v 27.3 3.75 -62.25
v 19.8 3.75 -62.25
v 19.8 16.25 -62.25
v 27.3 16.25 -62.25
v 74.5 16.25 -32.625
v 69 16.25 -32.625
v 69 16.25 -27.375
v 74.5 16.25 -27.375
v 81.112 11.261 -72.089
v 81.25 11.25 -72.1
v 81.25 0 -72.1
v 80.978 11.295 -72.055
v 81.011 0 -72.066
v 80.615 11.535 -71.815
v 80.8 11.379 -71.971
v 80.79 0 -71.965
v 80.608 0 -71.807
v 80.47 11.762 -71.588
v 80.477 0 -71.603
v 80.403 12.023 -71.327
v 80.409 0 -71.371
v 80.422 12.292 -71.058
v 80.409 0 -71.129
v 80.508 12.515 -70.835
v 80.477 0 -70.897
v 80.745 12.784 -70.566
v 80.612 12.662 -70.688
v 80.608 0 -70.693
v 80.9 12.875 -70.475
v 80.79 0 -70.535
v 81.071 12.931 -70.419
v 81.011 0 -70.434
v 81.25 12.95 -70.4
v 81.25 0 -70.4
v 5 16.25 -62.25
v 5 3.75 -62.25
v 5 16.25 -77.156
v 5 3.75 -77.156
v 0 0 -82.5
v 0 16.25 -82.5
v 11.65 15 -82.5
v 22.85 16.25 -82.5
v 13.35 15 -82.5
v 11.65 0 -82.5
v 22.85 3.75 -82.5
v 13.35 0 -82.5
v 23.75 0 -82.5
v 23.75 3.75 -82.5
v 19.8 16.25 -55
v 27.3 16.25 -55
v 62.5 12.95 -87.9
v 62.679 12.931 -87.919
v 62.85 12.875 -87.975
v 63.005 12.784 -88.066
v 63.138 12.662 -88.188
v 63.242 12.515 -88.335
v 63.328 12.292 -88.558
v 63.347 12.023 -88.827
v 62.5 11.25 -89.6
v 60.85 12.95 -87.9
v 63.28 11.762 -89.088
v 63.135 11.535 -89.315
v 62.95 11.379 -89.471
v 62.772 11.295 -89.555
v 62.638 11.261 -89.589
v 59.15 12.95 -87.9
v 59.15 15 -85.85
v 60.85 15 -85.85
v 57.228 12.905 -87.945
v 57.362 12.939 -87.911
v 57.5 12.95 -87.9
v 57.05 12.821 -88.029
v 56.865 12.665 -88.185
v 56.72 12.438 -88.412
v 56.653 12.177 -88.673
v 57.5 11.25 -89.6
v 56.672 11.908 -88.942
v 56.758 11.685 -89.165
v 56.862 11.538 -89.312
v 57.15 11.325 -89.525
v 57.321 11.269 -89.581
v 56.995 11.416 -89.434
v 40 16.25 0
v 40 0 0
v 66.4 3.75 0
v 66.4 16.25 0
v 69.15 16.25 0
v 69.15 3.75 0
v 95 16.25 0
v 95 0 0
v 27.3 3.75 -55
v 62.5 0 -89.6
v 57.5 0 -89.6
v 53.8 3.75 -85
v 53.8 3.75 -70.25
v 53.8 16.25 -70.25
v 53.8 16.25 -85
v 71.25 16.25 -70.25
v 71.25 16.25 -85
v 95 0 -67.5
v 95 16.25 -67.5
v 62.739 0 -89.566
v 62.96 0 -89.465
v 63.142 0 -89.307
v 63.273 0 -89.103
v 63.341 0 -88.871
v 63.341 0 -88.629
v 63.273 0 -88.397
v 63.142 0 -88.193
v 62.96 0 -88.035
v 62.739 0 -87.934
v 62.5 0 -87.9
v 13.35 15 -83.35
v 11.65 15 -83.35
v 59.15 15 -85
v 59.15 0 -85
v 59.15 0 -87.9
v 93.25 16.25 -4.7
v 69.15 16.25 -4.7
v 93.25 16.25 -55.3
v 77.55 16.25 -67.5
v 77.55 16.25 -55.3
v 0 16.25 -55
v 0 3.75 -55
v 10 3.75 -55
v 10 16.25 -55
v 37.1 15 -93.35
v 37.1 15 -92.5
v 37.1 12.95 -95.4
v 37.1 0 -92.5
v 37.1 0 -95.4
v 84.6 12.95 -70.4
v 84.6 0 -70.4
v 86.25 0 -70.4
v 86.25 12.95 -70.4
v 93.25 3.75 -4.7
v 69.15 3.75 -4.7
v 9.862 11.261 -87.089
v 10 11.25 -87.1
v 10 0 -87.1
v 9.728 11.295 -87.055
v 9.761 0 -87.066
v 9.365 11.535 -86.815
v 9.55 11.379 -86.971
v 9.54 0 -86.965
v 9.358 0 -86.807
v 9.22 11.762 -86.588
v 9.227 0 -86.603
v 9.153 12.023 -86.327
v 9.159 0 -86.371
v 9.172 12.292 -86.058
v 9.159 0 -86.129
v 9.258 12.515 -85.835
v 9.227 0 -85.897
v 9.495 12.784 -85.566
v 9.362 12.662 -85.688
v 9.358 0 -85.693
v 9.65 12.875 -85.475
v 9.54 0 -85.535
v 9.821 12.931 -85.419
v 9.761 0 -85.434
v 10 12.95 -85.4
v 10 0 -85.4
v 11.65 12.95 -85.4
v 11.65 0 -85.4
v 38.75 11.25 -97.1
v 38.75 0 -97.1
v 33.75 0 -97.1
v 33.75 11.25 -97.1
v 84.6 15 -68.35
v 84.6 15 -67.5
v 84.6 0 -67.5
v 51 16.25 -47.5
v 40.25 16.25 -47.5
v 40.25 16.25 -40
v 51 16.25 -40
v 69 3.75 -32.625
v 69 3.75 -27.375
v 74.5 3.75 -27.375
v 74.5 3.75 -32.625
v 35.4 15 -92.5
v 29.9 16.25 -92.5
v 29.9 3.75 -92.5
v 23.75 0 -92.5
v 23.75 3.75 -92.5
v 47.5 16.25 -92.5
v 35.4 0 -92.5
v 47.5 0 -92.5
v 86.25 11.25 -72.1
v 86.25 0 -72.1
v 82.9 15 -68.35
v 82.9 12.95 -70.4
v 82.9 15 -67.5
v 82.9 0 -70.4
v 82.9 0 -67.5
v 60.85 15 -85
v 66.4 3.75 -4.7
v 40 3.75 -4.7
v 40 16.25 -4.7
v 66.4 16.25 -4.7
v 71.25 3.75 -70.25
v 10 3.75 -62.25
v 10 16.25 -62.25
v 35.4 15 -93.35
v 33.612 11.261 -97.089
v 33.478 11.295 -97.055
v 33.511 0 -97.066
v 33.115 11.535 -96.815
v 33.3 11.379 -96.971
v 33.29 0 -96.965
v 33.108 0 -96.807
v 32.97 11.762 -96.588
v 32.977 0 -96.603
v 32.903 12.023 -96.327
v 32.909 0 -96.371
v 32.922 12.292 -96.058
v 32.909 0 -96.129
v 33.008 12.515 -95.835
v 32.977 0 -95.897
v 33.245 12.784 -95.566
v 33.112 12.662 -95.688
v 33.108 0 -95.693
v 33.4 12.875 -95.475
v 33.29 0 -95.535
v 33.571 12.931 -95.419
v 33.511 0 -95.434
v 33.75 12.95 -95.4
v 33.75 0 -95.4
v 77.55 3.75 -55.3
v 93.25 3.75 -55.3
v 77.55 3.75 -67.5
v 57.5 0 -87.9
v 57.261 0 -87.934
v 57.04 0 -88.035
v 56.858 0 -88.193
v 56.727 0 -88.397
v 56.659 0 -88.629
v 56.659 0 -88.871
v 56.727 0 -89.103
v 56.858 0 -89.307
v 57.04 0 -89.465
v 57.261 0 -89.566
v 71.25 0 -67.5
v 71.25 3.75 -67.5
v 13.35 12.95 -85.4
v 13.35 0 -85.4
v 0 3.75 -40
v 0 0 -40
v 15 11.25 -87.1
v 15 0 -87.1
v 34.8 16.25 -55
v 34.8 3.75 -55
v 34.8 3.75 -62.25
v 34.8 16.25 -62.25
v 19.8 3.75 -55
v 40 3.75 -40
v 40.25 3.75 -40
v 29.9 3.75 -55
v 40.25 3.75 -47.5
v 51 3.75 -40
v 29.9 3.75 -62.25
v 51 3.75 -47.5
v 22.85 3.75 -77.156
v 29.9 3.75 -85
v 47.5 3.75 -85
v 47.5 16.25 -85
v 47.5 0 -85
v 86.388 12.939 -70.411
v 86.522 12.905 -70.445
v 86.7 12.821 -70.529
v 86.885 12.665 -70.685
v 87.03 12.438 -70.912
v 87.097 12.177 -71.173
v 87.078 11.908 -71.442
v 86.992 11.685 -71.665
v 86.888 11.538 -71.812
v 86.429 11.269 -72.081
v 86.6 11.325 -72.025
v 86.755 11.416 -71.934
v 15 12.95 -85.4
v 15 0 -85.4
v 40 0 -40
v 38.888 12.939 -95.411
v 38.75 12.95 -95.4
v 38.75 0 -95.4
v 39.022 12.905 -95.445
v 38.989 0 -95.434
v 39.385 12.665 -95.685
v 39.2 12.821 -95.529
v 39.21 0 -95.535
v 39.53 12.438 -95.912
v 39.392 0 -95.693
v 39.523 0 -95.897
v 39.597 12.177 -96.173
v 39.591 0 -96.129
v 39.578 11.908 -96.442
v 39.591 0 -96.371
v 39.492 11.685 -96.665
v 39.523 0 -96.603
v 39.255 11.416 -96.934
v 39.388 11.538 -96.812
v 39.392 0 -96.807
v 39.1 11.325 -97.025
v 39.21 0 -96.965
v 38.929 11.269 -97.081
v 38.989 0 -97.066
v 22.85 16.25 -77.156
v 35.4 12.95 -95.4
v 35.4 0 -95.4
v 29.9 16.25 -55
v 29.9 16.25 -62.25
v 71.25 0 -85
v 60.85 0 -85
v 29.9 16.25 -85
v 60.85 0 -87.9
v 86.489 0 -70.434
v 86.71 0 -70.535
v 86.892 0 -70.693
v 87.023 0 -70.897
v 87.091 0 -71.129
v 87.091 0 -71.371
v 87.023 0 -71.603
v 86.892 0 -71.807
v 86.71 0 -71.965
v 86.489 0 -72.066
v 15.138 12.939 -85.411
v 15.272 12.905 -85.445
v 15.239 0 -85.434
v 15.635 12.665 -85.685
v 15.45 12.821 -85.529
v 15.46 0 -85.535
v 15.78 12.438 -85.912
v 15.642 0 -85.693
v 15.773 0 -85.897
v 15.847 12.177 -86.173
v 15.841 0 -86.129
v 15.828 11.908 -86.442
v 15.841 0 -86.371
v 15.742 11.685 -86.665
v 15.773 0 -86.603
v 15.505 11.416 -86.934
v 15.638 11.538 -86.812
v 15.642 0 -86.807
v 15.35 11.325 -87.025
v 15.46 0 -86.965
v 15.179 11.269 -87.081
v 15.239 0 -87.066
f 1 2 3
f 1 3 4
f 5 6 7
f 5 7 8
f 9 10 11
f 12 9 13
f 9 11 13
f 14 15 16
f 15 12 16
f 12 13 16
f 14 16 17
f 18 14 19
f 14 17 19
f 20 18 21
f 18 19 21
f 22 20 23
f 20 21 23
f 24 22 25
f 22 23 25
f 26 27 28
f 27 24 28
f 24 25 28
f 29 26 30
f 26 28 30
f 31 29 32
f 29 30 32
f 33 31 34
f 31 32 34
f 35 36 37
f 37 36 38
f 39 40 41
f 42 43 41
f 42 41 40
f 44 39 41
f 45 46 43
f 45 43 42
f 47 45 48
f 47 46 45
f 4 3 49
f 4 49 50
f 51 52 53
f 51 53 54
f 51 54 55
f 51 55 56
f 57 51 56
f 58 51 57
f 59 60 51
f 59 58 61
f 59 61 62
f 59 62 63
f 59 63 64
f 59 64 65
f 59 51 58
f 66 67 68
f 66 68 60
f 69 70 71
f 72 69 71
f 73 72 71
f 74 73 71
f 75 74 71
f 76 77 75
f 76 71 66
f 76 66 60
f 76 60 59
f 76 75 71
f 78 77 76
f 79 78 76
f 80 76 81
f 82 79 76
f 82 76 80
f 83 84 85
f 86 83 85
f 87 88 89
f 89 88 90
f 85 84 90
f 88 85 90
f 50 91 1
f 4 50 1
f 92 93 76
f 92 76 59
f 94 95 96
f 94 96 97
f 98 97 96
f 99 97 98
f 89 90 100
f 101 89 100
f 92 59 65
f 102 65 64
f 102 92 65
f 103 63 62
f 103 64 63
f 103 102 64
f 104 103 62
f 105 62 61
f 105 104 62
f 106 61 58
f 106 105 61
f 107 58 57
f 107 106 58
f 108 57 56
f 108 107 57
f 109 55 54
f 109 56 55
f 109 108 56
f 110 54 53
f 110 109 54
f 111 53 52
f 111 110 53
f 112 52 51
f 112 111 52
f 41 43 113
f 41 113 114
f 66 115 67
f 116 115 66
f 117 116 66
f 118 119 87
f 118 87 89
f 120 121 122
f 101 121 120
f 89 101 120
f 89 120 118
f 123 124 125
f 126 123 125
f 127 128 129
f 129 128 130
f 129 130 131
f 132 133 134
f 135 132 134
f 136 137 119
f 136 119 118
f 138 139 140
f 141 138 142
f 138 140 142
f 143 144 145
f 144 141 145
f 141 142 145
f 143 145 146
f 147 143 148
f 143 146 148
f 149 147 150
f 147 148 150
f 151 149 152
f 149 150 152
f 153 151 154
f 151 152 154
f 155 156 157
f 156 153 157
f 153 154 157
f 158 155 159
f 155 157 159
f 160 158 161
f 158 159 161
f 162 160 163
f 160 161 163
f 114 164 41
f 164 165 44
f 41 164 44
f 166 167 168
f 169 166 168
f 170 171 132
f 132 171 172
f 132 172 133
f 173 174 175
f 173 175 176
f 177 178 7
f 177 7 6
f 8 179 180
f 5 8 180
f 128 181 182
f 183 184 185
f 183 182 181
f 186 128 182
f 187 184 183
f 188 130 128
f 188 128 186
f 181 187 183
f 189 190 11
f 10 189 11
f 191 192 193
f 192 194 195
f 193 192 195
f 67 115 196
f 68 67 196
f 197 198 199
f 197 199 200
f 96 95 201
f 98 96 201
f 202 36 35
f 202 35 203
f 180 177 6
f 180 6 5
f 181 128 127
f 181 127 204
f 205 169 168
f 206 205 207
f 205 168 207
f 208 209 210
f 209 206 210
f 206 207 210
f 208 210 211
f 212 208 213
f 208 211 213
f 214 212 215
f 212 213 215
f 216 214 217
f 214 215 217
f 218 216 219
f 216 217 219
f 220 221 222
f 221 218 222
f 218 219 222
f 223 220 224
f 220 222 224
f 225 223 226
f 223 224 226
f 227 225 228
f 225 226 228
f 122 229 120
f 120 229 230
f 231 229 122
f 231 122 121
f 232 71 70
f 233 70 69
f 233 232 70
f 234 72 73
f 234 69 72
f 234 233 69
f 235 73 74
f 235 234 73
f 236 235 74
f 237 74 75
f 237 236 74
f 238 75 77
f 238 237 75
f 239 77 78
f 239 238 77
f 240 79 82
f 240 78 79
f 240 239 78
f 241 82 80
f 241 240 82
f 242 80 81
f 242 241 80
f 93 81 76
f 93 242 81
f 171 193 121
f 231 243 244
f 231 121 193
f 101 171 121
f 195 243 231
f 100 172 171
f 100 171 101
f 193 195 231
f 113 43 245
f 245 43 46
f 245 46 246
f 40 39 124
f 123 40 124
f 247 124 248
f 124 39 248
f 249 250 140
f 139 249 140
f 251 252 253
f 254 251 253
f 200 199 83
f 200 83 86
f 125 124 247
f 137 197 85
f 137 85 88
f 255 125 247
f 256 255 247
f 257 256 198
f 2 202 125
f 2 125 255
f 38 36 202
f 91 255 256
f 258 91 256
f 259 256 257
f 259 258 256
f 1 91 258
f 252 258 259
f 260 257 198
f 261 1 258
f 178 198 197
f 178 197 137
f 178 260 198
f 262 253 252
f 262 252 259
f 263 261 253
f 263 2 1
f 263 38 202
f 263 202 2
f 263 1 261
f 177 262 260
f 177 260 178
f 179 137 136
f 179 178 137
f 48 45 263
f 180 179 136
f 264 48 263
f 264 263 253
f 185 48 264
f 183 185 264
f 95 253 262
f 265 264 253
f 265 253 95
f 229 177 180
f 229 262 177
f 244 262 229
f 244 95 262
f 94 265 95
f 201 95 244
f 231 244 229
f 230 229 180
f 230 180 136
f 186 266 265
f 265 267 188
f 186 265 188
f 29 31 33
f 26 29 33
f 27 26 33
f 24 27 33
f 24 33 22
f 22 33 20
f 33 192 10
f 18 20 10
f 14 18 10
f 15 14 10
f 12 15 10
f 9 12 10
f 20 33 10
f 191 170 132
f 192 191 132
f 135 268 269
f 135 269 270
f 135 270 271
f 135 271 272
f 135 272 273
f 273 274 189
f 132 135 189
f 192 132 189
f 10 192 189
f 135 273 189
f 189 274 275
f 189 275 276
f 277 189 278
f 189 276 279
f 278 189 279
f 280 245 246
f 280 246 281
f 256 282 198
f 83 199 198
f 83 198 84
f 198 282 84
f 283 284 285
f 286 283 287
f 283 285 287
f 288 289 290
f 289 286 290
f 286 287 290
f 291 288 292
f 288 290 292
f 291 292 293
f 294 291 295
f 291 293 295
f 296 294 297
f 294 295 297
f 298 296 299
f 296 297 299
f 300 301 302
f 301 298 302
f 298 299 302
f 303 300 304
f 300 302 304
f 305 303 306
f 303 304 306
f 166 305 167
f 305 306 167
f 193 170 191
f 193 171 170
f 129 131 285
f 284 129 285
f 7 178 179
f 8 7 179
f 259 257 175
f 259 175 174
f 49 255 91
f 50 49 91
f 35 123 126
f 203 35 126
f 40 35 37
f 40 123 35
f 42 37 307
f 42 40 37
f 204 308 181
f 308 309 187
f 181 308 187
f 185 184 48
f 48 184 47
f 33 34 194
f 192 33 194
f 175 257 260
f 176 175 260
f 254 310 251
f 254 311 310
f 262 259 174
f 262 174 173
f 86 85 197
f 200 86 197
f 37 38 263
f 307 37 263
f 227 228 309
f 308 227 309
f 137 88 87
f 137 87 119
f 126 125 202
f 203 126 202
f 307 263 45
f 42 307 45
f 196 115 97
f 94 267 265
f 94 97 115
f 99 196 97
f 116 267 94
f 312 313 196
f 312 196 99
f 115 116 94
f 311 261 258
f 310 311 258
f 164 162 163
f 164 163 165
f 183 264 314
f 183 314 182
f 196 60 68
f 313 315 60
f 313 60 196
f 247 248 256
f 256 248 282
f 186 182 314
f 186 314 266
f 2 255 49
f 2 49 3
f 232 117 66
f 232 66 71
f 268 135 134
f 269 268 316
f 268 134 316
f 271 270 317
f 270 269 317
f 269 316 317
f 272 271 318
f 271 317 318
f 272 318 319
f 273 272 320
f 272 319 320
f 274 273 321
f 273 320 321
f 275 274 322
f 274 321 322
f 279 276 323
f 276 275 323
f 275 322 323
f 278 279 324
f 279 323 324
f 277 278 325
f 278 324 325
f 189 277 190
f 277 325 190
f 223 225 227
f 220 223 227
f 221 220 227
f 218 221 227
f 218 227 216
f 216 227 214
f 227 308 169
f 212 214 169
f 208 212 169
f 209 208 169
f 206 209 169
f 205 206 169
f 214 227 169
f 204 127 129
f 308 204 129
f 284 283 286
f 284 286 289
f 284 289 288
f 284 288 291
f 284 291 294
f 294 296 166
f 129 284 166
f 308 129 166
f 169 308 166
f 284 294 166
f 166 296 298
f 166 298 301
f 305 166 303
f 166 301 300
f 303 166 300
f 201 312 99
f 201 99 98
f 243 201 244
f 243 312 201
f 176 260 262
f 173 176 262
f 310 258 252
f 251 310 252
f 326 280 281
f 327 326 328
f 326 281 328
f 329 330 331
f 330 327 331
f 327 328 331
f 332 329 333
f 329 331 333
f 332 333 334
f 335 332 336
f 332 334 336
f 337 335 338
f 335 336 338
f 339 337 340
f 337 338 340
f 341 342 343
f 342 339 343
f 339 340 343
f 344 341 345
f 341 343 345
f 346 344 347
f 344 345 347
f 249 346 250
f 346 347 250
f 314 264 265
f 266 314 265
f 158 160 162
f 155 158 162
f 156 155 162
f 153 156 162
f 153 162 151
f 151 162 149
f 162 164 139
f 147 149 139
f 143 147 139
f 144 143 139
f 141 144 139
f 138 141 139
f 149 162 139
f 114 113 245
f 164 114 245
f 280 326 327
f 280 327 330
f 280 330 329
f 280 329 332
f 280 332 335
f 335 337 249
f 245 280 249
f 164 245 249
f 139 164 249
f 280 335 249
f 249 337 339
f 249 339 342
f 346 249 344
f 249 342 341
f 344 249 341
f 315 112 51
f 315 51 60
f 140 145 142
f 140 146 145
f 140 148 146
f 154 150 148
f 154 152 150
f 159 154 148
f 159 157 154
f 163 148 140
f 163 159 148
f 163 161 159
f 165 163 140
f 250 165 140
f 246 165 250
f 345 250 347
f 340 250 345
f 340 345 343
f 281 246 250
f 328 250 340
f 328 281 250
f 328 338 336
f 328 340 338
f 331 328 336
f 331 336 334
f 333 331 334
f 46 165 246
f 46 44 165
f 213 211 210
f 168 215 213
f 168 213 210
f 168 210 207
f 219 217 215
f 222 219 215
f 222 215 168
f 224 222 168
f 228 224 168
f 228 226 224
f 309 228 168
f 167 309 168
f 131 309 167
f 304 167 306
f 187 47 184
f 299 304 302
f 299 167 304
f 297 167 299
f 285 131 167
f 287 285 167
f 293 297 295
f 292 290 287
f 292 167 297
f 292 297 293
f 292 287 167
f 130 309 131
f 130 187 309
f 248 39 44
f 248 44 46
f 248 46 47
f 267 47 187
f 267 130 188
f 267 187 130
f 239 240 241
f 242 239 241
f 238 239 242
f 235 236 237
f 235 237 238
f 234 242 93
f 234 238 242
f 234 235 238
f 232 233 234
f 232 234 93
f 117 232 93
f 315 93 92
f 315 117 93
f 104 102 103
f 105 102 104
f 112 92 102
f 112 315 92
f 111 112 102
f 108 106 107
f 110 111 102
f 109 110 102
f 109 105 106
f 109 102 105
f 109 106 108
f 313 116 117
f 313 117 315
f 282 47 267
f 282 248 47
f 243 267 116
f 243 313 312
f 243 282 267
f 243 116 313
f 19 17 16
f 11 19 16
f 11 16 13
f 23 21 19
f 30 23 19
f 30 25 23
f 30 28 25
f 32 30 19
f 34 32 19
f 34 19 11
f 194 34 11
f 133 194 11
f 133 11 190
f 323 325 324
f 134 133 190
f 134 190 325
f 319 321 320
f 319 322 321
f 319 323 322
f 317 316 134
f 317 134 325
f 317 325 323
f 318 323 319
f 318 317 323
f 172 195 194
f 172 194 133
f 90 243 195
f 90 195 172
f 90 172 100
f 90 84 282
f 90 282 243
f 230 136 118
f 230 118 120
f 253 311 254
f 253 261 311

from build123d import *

# Parameters (mm, degrees)
BOSS_EXTRUDE1_DEPTH     = 3.75
SKETCH2_W               = 17.7
SKETCH2_H               = 14.8
SKETCH2_H_2             = 17.5
SKETCH2_W_2             = 7.5
SKETCH2_H_3             = 22.5
SKETCH2_H_4             = 10
SKETCH2_W_3             = 26.4
SKETCH2_H_5             = 4.8
SKETCH2_W_4             = 11
SKETCH2_H_6             = 7.5
SKETCH2_W_5             = 10
SKETCH2_W_6             = 23.1
SKETCH2_H_7             = 7.843975032
SKETCH2_W_7             = 26.1
SKETCH2_W_8             = 5
SKETCH2_W_9             = 5.5
SKETCH2_H_8             = 5.25
BOSS_EXTRUDE2_DEPTH     = 12.5
SKETCH5_W               = 23.75
SKETCH5_H               = 2.5
CUT_EXTRUDE2_DEPTH      = 136.329459099
BOSS_EXTRUDE3_DEPTH     = 15
CHAMFER1_SIZE           = 3.75
CUT_EXTRUDE3_DEPTH      = 137.811814183
CUT_EXTRUDE3_DEPTH_BACK = 12.5
SKETCH7_W               = 0.25
SKETCH7_H               = 5.343975032
SKETCH7_W_2             = 0.1
SKETCH7_H_2             = 7.5
SKETCH7_H_3             = 15
SKETCH7_H_4             = 12.3
SKETCH7_H_5             = 4.8
CUT_EXTRUDE4_DEPTH      = 137.811814183
CUT_EXTRUDE4_DEPTH_BACK = 12.5
SKETCH9_W               = 17.45
SKETCH9_H               = 0.1
SKETCH9_H_2             = 0.25
SKETCH9_W_2             = 34.8
SKETCH9_W_3             = 55
SKETCH10_W              = 1.75
SKETCH10_H              = 50.6
SKETCH10_W_2            = 5
SKETCH10_H_2            = 14.906024968
BOSS_EXTRUDE5_DEPTH     = 12.5


with BuildPart() as part:
    # Sketch1 → Boss-Extrude1 (new body)
    with BuildSketch(Plane(origin=(0, 0, 0), x_dir=(1, 0, 0), z_dir=(0, 1, 0))):
        Polygon((40, 0), (95, 0), (95, 70), (71.25, 70), (71.25, 87.5), (47.5, 87.5), (47.5, 95), (23.75, 95), (23.75, 85), (0, 85), (0, 40), (40, 40), align=None)
    extrude(amount=BOSS_EXTRUDE1_DEPTH)

    # Sketch2 → Boss-Extrude2 (add)
    with BuildSketch(Plane(origin=(0, 3.75, 0), x_dir=(1, 0, 0), z_dir=(0, 1, 0))):
        with Locations((86.15, 62.6)):
            Rectangle(SKETCH2_W, SKETCH2_H)
        with Locations((62.4, 78.75)):
            Rectangle(SKETCH2_W, SKETCH2_H_2)
        with Locations((23.55, 51.25)):
            Rectangle(SKETCH2_W_2, SKETCH2_H_3)
        with Locations((38.65, 90)):
            Rectangle(SKETCH2_W, SKETCH2_H_4)
        with Locations((53.2, 2.4)):
            Rectangle(SKETCH2_W_3, SKETCH2_H_5)
        with Locations((45.5, 43.75)):
            Rectangle(SKETCH2_W_4, SKETCH2_H_6)
        with Locations((5, 51.25)):
            Rectangle(SKETCH2_W_5, SKETCH2_H_3)
        with Locations((11.55, 81.078012484)):
            Rectangle(SKETCH2_W_6, SKETCH2_H_7)
        with Locations((81.95, 2.4)):
            Rectangle(SKETCH2_W_7, SKETCH2_H_5)
        with Locations((32.3, 51.25)):
            Rectangle(SKETCH2_W_8, SKETCH2_H_3)
        with Locations((71.75, 30)):
            Rectangle(SKETCH2_W_9, SKETCH2_H_8)
    extrude(amount=BOSS_EXTRUDE2_DEPTH)

    # Sketch5 → Cut-Extrude2 (cut, through all)
    with BuildSketch(Plane.XZ):
        with Locations((11.875, -83.75)):
            Rectangle(SKETCH5_W, SKETCH5_H)
        with Locations((59.375, -86.25)):
            Rectangle(SKETCH5_W, SKETCH5_H)
        with Locations((35.625, -93.75)):
            Rectangle(SKETCH5_W, SKETCH5_H)
        with Locations((83.125, -68.75)):
            Rectangle(SKETCH5_W, SKETCH5_H)
    extrude(amount=-CUT_EXTRUDE2_DEPTH, mode=Mode.SUBTRACT)

    # Sketch6 → Boss-Extrude3 (add)
    with BuildSketch(Plane.XZ):
        with BuildLine():
            Line((59.15, -87.9), (57.5, -87.9))
            ThreePointArc((57.5, -87.9), (56.65, -88.75), (57.5, -89.6))
            Line((57.5, -89.6), (62.5, -89.6))
            ThreePointArc((62.5, -89.6), (63.35, -88.75), (62.5, -87.9))
            Line((62.5, -87.9), (60.85, -87.9))
            Line((60.85, -87.9), (60.85, -85))
            ThreePointArc((60.85, -85), (60, -84.15), (59.15, -85))
            Line((59.15, -85), (59.15, -87.9))
        make_face()
        with BuildLine():
            Line((37.1, -95.4), (38.75, -95.4))
            ThreePointArc((38.75, -95.4), (39.6, -96.25), (38.75, -97.1))
            Line((38.75, -97.1), (33.75, -97.1))
            ThreePointArc((33.75, -97.1), (32.9, -96.25), (33.75, -95.4))
            Line((33.75, -95.4), (35.4, -95.4))
            Line((35.4, -95.4), (35.4, -92.5))
            ThreePointArc((35.4, -92.5), (36.25, -91.65), (37.1, -92.5))
            Line((37.1, -92.5), (37.1, -95.4))
        make_face()
        with BuildLine():
            Line((13.35, -85.4), (15, -85.4))
            ThreePointArc((15, -85.4), (15.85, -86.25), (15, -87.1))
            Line((15, -87.1), (10, -87.1))
            ThreePointArc((10, -87.1), (9.15, -86.25), (10, -85.4))
            Line((10, -85.4), (11.65, -85.4))
            Line((11.65, -85.4), (11.65, -82.5))
            ThreePointArc((11.65, -82.5), (12.5, -81.65), (13.35, -82.5))
            Line((13.35, -82.5), (13.35, -85.4))
        make_face()
        with BuildLine():
            Line((81.25, -70.4), (82.9, -70.4))
            Line((82.9, -70.4), (82.9, -67.5))
            ThreePointArc((82.9, -67.5), (83.75, -66.65), (84.6, -67.5))
            Line((84.6, -67.5), (84.6, -70.4))
            Line((84.6, -70.4), (86.25, -70.4))
            ThreePointArc((86.25, -70.4), (87.1, -71.25), (86.25, -72.1))
            Line((86.25, -72.1), (81.25, -72.1))
            ThreePointArc((81.25, -72.1), (80.4, -71.25), (81.25, -70.4))
        make_face()
    extrude(amount=-BOSS_EXTRUDE3_DEPTH)

    # Chamfer1
    # the kernel refuses this chamfer: 3.75 mm, written as the material it takes off along each edge
    with BuildSketch(Plane(origin=(47.856188795, 15, -89.6), x_dir=(0, 0.027495876610586334, 0.9996219169112968), z_dir=(1, 0, 0))) as chamfer1_piece_1:
        Polygon((CHAMFER1_SIZE * 0.999621916911, CHAMFER1_SIZE * 0.0274958766106), (-CHAMFER1_SIZE * 0.0274958766106, CHAMFER1_SIZE * 0.999621916911), (0, 0), align=None)
    extrude(amount=24.28762241, mode=Mode.SUBTRACT)
    with BuildSketch(Plane(origin=(48.393811205, 15, -97.1), x_dir=(0, 0.027495876610586334, 0.9996219169112968), z_dir=(-1, 0, 0)), Plane(origin=(95.893811205, 15, -72.1), x_dir=(0, 0.027495876610586334, 0.9996219169112968), z_dir=(-1, 0, 0)), Plane(origin=(24.643811205, 15, -87.1), x_dir=(0, 0.027495876610586334, 0.9996219169112968), z_dir=(-1, 0, 0))) as chamfer1_piece_2:
        Polygon((CHAMFER1_SIZE * 0.999621916911, -CHAMFER1_SIZE * 0.0274958766106), (-CHAMFER1_SIZE * 0.0274958766106, -CHAMFER1_SIZE * 0.999621916911), (0, 0), align=None)
    extrude(amount=24.28762241, mode=Mode.SUBTRACT)

    # Sketch7 → Cut-Extrude3 (cut, two sides: drawn at the far end of the back side and taken through both)
    with BuildSketch(Plane(origin=(0, 16.25, 0), x_dir=(1, 0, 0), z_dir=(0, 1, 0)).offset(-CUT_EXTRUDE3_DEPTH_BACK)):
        with Locations((22.975, 79.828012484)):
            Rectangle(SKETCH7_W, SKETCH7_H)
        with Locations((29.85, 88.75)):
            Rectangle(SKETCH7_W_2, SKETCH7_H_2)
        Polygon((29.8, 62.5), (29.9, 62.5), (29.9, 55), (34.8, 55), (34.8, 40), (0, 40), (0, 55), (29.8, 55), align=None)
        with Locations((53.675, 77.5)):
            Rectangle(SKETCH7_W, SKETCH7_H_3)
        with Locations((40.125, 43.75)):
            Rectangle(SKETCH7_W, SKETCH7_H_2)
        with Locations((77.425, 61.35)):
            Rectangle(SKETCH7_W, SKETCH7_H_4)
        with Locations((69.025, 2.4)):
            Rectangle(SKETCH7_W, SKETCH7_H_5)
    extrude(amount=CUT_EXTRUDE3_DEPTH + CUT_EXTRUDE3_DEPTH_BACK, mode=Mode.SUBTRACT)

    # Sketch9 → Cut-Extrude4 (cut, two sides: drawn at the far end of the back side and taken through both)
    with BuildSketch(Plane(origin=(0, 16.25, 0), x_dir=(1, 0, 0), z_dir=(0, 1, 0)).offset(-CUT_EXTRUDE4_DEPTH_BACK)):
        with Locations((86.275, 55.25)):
            Rectangle(SKETCH9_W, SKETCH9_H)
        with Locations((62.525, 70.125)):
            Rectangle(SKETCH9_W, SKETCH9_H_2)
        with Locations((17.4, 62.375)):
            Rectangle(SKETCH9_W_2, SKETCH9_H_2)
        with Locations((67.5, 4.75)):
            Rectangle(SKETCH9_W_3, SKETCH9_H)
    extrude(amount=CUT_EXTRUDE4_DEPTH + CUT_EXTRUDE4_DEPTH_BACK, mode=Mode.SUBTRACT)

    # Sketch10 → Boss-Extrude5 (add)
    with BuildSketch(Plane(origin=(0, 3.75, 0), x_dir=(1, 0, 0), z_dir=(0, 1, 0))):
        with Locations((94.125, 30)):
            Rectangle(SKETCH10_W, SKETCH10_H)
        with Locations((2.5, 69.703012484)):
            Rectangle(SKETCH10_W_2, SKETCH10_H_2)
    extrude(amount=BOSS_EXTRUDE5_DEPTH)


solid = part.part
